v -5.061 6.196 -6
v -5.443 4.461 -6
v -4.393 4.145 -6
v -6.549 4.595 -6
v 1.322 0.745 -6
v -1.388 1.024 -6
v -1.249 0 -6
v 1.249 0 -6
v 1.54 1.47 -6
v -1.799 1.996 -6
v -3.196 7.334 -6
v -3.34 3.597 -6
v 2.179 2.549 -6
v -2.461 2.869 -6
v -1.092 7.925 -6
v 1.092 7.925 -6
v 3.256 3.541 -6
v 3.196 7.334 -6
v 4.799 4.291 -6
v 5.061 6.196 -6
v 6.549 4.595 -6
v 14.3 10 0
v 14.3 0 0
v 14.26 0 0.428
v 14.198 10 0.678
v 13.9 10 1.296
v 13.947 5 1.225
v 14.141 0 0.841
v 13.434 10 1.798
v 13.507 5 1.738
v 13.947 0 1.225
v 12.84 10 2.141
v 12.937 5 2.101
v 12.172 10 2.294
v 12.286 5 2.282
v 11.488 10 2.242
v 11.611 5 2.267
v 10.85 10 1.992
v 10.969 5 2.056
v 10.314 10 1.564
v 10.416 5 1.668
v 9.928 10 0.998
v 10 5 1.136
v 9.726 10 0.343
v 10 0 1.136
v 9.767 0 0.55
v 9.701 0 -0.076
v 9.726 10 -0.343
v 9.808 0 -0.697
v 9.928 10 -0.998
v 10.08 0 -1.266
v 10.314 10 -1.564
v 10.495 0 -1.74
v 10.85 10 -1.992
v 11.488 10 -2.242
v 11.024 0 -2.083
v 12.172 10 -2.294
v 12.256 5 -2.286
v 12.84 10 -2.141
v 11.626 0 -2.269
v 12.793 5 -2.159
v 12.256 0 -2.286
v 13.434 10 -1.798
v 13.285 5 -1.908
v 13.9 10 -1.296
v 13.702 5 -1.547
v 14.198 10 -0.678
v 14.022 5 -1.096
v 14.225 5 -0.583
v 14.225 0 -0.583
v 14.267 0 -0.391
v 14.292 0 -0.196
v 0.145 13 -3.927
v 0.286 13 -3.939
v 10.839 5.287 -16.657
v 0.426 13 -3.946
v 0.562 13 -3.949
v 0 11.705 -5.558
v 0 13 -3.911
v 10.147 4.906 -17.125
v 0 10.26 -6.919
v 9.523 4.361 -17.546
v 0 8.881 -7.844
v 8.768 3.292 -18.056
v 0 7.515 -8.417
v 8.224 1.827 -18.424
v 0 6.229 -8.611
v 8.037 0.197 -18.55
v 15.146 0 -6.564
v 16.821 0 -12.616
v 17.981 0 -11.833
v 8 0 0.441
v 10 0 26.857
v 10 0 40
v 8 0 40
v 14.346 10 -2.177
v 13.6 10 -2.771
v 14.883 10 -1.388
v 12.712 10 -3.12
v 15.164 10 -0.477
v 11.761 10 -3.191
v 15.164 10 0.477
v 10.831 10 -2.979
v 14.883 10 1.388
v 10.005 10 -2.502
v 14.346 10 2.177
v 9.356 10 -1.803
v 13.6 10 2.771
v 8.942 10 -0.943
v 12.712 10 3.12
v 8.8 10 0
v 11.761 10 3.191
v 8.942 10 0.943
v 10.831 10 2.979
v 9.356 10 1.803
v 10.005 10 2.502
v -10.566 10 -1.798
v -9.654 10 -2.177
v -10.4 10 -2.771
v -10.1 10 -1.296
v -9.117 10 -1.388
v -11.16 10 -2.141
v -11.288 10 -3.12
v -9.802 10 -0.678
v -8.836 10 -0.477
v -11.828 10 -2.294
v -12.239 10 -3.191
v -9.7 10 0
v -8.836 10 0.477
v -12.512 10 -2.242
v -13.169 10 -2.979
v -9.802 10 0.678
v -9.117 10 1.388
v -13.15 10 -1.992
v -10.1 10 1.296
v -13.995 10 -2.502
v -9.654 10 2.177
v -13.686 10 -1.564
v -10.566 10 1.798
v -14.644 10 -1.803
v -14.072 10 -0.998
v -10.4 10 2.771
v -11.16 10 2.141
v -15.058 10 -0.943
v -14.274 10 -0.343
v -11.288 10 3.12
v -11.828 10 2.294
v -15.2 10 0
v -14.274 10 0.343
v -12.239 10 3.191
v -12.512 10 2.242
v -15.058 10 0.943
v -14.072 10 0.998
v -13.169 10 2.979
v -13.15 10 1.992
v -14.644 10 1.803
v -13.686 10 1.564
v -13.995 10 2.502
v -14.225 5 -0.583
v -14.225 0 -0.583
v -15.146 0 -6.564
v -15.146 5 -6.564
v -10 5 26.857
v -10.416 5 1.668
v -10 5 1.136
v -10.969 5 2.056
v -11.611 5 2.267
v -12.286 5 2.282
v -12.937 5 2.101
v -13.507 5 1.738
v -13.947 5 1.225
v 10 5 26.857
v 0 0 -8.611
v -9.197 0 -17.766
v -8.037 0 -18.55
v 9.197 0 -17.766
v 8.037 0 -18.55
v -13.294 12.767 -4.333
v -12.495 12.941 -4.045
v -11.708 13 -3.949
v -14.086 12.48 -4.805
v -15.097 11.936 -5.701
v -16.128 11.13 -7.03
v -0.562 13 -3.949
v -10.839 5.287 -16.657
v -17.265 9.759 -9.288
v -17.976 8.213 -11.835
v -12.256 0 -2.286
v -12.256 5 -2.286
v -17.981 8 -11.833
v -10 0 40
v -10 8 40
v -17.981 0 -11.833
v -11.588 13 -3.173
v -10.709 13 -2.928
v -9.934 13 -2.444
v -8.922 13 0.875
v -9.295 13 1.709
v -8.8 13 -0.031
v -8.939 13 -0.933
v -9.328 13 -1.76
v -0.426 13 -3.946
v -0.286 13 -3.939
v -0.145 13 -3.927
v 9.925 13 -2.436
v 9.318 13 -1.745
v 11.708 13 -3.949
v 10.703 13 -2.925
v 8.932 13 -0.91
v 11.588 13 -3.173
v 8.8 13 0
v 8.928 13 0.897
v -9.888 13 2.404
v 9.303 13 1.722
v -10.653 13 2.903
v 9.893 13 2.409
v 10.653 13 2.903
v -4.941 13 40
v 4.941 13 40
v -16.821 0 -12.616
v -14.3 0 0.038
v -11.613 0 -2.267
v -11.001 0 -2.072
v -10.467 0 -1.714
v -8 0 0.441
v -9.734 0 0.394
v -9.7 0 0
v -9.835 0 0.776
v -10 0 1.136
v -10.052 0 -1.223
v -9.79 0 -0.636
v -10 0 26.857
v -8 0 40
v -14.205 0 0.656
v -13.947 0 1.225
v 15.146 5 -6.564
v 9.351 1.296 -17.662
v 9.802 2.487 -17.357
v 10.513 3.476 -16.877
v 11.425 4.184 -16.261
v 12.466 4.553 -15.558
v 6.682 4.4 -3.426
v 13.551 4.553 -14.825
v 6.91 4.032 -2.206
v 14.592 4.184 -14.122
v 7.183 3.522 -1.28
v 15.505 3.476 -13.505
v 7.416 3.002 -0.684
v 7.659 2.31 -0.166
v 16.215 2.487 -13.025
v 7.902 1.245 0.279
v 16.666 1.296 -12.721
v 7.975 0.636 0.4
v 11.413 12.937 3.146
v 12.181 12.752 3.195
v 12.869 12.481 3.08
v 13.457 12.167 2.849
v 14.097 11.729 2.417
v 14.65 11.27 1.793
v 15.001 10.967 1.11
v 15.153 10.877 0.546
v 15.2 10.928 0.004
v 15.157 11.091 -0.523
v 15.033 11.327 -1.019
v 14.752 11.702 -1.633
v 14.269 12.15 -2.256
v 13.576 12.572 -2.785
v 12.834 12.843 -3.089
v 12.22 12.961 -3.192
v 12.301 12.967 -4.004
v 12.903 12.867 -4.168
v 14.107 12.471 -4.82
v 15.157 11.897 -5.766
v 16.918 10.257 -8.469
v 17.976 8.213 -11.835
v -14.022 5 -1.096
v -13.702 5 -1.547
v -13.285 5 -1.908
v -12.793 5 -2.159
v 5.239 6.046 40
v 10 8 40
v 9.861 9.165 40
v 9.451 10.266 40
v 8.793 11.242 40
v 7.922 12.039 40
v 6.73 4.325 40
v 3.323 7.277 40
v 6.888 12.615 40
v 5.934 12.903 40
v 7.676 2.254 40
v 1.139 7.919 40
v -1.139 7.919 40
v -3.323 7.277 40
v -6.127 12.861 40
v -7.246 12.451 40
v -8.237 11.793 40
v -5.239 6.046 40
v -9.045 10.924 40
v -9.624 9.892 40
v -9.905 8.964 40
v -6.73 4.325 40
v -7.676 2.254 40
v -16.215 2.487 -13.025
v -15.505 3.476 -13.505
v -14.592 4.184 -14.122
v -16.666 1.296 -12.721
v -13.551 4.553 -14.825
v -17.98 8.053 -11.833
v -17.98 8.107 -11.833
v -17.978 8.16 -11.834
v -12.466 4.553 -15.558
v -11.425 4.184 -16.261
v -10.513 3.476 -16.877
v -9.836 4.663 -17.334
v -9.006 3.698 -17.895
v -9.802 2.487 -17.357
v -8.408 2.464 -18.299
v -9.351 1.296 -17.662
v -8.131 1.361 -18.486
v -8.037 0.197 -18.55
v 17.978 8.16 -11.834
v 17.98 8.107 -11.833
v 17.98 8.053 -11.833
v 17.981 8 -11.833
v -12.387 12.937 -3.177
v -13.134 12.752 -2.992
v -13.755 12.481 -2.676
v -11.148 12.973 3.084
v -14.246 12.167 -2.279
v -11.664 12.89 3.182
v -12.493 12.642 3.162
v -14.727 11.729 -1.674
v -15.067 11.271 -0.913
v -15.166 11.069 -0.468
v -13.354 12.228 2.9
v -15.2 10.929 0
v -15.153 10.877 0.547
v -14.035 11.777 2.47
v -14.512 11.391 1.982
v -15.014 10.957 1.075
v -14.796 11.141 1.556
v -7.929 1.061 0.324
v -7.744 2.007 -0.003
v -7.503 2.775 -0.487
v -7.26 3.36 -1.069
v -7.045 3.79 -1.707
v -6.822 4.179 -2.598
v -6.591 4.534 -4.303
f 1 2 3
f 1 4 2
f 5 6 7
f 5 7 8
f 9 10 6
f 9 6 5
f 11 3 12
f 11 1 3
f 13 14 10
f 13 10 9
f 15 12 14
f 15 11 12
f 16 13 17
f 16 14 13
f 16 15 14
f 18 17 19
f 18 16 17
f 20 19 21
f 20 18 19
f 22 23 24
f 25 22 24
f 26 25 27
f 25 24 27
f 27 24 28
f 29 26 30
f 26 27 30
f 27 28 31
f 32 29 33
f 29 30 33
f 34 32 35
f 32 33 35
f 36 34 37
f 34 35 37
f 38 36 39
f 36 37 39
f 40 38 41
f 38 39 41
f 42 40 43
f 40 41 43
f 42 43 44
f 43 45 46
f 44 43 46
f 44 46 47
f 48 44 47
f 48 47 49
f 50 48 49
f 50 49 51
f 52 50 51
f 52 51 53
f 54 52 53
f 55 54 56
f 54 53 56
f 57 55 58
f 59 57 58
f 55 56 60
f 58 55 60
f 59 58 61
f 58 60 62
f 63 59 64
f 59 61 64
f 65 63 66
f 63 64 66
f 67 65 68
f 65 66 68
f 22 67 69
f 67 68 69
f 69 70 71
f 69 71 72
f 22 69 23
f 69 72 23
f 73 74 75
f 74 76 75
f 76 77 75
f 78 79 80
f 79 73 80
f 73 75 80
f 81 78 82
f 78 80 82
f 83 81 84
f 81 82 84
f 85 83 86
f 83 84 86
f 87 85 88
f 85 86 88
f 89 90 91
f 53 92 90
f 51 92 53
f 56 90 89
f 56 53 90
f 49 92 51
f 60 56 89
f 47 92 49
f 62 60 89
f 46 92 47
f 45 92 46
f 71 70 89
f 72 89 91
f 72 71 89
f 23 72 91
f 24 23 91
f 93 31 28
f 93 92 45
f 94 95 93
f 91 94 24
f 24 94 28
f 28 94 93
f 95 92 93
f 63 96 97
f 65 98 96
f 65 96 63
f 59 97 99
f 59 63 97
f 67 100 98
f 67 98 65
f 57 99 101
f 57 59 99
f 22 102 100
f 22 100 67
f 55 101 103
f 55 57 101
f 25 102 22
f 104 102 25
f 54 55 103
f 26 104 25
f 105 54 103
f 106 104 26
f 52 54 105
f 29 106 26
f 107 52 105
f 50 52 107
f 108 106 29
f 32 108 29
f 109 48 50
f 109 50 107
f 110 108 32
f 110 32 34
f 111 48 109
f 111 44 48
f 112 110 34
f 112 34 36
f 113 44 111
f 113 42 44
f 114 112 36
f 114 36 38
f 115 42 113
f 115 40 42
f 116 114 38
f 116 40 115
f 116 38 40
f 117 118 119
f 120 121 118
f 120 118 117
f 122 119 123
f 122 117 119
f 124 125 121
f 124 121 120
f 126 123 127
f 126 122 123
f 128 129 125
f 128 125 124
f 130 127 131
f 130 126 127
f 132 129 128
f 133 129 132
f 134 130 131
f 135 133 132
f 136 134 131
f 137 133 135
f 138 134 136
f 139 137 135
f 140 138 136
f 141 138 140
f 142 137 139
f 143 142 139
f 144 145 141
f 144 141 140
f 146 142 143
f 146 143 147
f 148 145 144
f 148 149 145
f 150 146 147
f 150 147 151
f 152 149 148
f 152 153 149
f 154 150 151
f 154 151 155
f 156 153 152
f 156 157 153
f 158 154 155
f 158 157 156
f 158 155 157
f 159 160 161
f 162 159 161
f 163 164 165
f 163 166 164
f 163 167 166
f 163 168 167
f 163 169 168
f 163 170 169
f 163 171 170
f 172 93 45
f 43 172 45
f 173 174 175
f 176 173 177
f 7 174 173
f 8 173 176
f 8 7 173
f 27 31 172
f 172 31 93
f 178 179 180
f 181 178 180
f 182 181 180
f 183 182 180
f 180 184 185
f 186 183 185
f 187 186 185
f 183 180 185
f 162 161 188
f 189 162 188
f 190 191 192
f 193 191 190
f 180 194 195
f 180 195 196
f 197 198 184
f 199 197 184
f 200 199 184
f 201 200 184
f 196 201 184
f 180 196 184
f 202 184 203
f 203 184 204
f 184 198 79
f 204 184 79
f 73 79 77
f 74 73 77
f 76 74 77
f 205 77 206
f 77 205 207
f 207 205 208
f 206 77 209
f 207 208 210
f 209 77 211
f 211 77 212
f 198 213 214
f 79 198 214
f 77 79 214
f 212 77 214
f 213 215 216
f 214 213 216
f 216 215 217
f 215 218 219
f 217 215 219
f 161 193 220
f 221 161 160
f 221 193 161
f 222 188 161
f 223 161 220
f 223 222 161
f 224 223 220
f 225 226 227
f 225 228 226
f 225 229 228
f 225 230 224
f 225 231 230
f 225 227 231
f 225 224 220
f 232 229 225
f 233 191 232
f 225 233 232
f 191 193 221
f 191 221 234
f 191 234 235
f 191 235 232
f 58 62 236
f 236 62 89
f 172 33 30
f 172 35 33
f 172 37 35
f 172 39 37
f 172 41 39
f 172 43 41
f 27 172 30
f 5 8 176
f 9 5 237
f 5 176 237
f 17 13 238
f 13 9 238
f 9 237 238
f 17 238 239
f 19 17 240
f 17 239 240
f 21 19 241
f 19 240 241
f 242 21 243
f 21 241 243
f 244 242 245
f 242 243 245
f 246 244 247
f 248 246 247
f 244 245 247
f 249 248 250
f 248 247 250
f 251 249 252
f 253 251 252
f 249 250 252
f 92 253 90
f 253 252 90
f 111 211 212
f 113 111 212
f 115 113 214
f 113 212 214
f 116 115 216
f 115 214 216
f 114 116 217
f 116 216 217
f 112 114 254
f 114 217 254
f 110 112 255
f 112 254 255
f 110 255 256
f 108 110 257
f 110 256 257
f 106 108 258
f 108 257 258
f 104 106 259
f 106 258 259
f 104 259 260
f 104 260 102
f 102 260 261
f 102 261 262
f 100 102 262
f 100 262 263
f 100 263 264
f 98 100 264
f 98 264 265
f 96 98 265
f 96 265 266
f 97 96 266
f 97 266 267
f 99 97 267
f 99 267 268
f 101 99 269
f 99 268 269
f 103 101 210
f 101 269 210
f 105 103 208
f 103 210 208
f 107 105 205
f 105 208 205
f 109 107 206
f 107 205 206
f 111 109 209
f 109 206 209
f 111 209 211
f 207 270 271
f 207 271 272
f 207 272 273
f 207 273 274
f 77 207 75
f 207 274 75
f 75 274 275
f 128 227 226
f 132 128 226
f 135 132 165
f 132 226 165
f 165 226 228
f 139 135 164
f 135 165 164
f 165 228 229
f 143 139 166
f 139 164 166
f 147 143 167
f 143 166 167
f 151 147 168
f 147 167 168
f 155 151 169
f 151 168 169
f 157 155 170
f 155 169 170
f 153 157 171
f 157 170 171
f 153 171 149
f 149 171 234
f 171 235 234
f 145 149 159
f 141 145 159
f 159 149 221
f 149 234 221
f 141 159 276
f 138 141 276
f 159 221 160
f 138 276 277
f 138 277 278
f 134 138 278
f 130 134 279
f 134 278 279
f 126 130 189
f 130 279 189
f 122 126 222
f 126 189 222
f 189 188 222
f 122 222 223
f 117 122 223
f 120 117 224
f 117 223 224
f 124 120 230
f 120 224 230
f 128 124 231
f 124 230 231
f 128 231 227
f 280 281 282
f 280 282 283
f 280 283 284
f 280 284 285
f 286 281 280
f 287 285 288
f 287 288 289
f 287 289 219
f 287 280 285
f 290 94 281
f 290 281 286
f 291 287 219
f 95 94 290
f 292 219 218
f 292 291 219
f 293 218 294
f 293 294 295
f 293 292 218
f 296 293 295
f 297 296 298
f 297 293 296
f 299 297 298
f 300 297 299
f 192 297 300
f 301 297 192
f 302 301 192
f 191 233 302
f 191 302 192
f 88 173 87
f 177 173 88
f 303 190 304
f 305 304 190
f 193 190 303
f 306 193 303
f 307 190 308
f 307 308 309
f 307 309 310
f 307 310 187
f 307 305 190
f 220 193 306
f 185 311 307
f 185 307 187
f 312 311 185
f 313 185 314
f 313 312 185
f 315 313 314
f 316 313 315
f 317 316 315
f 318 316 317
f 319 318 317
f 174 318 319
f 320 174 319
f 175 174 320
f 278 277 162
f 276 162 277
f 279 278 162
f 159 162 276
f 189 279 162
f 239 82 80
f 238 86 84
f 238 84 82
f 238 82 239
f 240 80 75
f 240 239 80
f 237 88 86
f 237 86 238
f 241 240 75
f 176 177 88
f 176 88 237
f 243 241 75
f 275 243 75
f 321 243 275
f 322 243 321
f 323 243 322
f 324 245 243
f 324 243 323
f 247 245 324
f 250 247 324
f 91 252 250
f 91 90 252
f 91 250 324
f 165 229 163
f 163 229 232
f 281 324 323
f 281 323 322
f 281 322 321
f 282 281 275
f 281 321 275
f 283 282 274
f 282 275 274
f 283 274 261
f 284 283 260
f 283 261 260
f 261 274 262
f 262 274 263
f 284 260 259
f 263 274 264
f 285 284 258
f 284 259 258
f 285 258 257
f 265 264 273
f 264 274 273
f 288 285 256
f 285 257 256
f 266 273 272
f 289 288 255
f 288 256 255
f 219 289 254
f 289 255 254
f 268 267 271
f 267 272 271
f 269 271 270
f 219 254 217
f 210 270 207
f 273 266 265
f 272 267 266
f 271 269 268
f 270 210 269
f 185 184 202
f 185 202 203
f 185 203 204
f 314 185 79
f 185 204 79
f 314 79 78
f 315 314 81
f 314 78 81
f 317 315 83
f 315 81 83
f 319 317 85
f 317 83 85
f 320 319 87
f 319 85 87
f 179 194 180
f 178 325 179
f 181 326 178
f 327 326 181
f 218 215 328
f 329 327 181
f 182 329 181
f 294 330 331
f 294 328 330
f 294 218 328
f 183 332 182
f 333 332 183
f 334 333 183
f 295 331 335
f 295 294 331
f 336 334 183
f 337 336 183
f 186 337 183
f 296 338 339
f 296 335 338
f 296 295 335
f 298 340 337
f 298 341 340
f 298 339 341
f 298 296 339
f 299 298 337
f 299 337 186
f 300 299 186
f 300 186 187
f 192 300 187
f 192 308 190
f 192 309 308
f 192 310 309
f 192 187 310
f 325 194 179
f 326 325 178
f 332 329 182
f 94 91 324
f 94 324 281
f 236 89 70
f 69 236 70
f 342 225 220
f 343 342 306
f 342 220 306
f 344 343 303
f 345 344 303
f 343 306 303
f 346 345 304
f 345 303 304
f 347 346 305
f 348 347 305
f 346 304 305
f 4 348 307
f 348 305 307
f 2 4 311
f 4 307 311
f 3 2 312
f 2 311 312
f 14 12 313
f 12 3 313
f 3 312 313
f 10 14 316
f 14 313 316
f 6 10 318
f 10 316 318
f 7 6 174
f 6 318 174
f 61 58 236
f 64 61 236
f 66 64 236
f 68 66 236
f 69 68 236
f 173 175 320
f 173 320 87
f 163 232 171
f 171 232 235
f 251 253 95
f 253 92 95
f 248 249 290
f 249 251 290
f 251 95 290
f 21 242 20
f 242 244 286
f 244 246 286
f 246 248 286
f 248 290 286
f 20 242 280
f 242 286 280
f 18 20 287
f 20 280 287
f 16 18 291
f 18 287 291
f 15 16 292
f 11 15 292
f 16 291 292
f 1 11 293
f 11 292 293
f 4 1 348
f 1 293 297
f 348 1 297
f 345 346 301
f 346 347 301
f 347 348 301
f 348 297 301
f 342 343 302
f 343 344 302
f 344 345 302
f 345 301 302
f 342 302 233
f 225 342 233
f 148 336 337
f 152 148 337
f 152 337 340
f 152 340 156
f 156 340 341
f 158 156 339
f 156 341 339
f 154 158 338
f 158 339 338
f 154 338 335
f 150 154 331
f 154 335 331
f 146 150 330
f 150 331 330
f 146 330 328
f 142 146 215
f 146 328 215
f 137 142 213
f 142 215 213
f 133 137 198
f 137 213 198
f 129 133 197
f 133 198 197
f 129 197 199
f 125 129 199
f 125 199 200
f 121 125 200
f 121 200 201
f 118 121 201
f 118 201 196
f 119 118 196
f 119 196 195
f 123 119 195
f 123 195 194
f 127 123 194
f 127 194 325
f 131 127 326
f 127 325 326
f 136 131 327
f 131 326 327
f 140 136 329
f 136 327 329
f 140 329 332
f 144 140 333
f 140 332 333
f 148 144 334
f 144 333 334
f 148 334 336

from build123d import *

# Parameters (mm, degrees)
F0_R          = 2.3
F1_DEPTH      = 13
F3_DEPTH      = 46
F6_DEPTH      = 52.2
F8_DEPTH      = 25
F10_DEPTH     = 25
F11_T1_DEPTH  = 69.4664340584
F11_T3_DEPTH  = 69.4664340584
F11_T8_DEPTH  = 31.9524083705
F11_T13_DEPTH = 31.9524083705
F11_T19_DEPTH = 31.9524083705
F11_T23_DEPTH = 31.9524083705
F15_DEPTH     = 5
F16_DEPTH     = 5
F18_R         = 3.2
F19_DEPTH     = 28


# Not quite as in the source:
# - a fillet or chamfer that OpenCascade refuses, or shapes differently, is made with other operations: its cross-section is extruded or revolved along the edge and cut away or added
# - a feature names something its author has since deleted; it is built from what else it names


with BuildPart() as f1:
    # F0 (on Front) → F1 (new body)
    with BuildSketch(Plane.XZ):
        Polygon((10, 40), (-10, 40), (-17.9806351662, -11.8325809017), (-8.0368565166, -18.5498173996), (0, -8.6111112242), (8.0368565166, -18.5498173996), (17.9806351662, -11.8325809017), align=None)
        with Locations((-12, 0)):
            Circle(F0_R, mode=Mode.SUBTRACT)
        with Locations((12, 0)):
            Circle(F0_R, mode=Mode.SUBTRACT)
    extrude(amount=-F1_DEPTH)

    # F2 (on face) → F3 (cut)
    with BuildSketch(Plane.XY.offset(40)):
        with BuildLine():
            Line((-8, 0), (8, 0))
            ThreePointArc((8, 0), (0, 8), (-8, 0))
        make_face()
    extrude(amount=-F3_DEPTH, mode=Mode.SUBTRACT)

    # F5 (on offset) → F6 (cut)
    with BuildSketch(Plane.YZ.offset(25)):
        Polygon((13, -3.9485500787), (4.1381944902, -18.5498173996), (13, -18.5498173996), align=None)
    extrude(amount=-F6_DEPTH, mode=Mode.SUBTRACT)

    # F7 (on face) → F8 (cut)
    with BuildSketch(Plane(origin=(-11.122658813, 0, -16.4652915326), x_dir=(0.8286482208, 0, -0.5597697082), z_dir=(-0.5597697082, 0, -0.8286482208))):
        with BuildLine():
            ThreePointArc((-6.8761009811, 0), (-2.2761009811, -4.6), (2.3238990189, 0))
            Line((2.3238990189, 0), (-6.8761009811, 0))
        make_face()
    extrude(amount=-F8_DEPTH, mode=Mode.SUBTRACT)

    # F9 (on face) → F10 (cut)
    with BuildSketch(Plane(origin=(11.122658813, 0, -16.4652915326), x_dir=(0.8286482208, 0, 0.5597697082), z_dir=(0.5597697082, 0, -0.8286482208))):
        with BuildLine():
            ThreePointArc((-2.3238990189, 0), (2.2761009811, -4.6), (6.8761009811, 0))
            Line((6.8761009811, 0), (-2.3238990189, 0))
        make_face()
    extrude(amount=-F10_DEPTH, mode=Mode.SUBTRACT)

    # F11: fillet of radius 5 on 4 edges, made by hand

    # F11_s2 → F11_t1 (cut)
    with BuildSketch(Plane(origin=(7.6867833124, 0, 49.9240736631), x_dir=(0, 1, 0), z_dir=(-0.152176248, 0, -0.9883533728))):
        with BuildLine():
            ThreePointArc((13, -10.9705836466), (11.5355339059, -14.5061175525), (8, -15.9705836466))
            Line((8, -15.9705836466), (13, -15.9705836466))
            Line((13, -15.9705836466), (13, -10.9705836466))
        make_face()
    extrude(amount=F11_T1_DEPTH, mode=Mode.SUBTRACT)

    # F11_s4 → F11_t3 (cut)
    with BuildSketch(Plane(origin=(2.8843579817, 0, -18.733310736), x_dir=(0, 1, 0), z_dir=(-0.152176248, 0, 0.9883533728))):
        with BuildLine():
            ThreePointArc((8, -15.9705836466), (11.5355339059, -14.5061175525), (13, -10.9705836466))
            Line((13, -10.9705836466), (13, -15.9705836466))
            Line((13, -15.9705836466), (8, -15.9705836466))
        make_face()
    extrude(amount=F11_T3_DEPTH, mode=Mode.SUBTRACT)


with BuildPart() as f11_tool6:
    # F11_s7 → F11_t8 (new body)
    with BuildSketch(Plane(origin=(4.0911710208, 3.0705977915, 5.0593097692), x_dir=(0.6002776597, -0.7997916799, 0), z_dir=(-0.5686414, -0.4267895471, -0.7032052622))):
        with BuildLine():
            ThreePointArc((-10.7347001393, -7.9787789452), (-7.9821654916, -9.2854915519), (-4.9822833283, -8.7519638303))
            Line((-4.9822833283, -8.7519638303), (-8.1340389445, -10.4154145762))
            Line((-8.1340389445, -10.4154145762), (-10.7347001393, -7.9787789452))
        make_face()
    extrude(amount=F11_T8_DEPTH)

    split(bisect_by=Plane(origin=(-4.2102294585, 0, -3.404568911), x_dir=(0, 1, 0), z_dir=(-0.7775800359, 0, -0.6287839754)), keep=Keep.TOP)


with BuildPart() as f1_1:
    add(f1.part)

    # F11_t5: cut F11_tool6
    add(f11_tool6.part, mode=Mode.SUBTRACT)


with BuildPart() as f11_tool11:
    # F11_s12 → F11_t13 (new body)
    with BuildSketch(Plane(origin=(14.0782912081, -10.566356105, -17.4097919354), x_dir=(-0.6002776597, -0.7997916799, 0), z_dir=(-0.5686414, 0.4267895471, 0.7032052622))):
        with BuildLine():
            ThreePointArc((-10.7347001393, -7.9787789452), (-7.9821654916, -9.2854915519), (-4.9822833283, -8.7519638303))
            Line((-4.9822833283, -8.7519638303), (-8.1340389445, -10.4154145762))
            Line((-8.1340389445, -10.4154145762), (-10.7347001393, -7.9787789452))
        make_face()
    extrude(amount=F11_T13_DEPTH)

    split(bisect_by=Plane(origin=(4.2102294585, 0, -3.404568911), x_dir=(0, 1, 0), z_dir=(0.7775800359, 0, -0.6287839754)), keep=Keep.TOP)


with BuildPart() as f1_2:
    add(f1_1.part)

    # F11_t10: cut F11_tool11
    add(f11_tool11.part, mode=Mode.SUBTRACT)


with BuildPart() as f11_tool17:
    # F11_s18 → F11_t19 (new body)
    with BuildSketch(Plane(origin=(14.0782912081, -10.566356105, -17.4097919354), x_dir=(-0.6002776597, -0.7997916799, 0), z_dir=(-0.5686414, 0.4267895471, 0.7032052622))):
        with BuildLine():
            ThreePointArc((-10.7347001393, -7.9787789452), (-7.9821654916, -9.2854915519), (-4.9822833283, -8.7519638303))
            Line((-4.9822833283, -8.7519638303), (-8.1340389445, -10.4154145762))
            Line((-8.1340389445, -10.4154145762), (-10.7347001393, -7.9787789452))
        make_face()
    extrude(amount=F11_T19_DEPTH)

    split(bisect_by=Plane(origin=(4.2102294585, 0, -3.404568911), x_dir=(0, 1, 0), z_dir=(-0.7775800359, 0, 0.6287839754)), keep=Keep.TOP)


with BuildPart() as f11_tool21:
    # F11_s22 → F11_t23 (new body)
    with BuildSketch(Plane(origin=(4.0911710208, 3.0705977915, 5.0593097692), x_dir=(0.6002776597, -0.7997916799, 0), z_dir=(-0.5686414, -0.4267895471, -0.7032052622))):
        with BuildLine():
            ThreePointArc((-10.7347001393, -7.9787789452), (-7.9821654916, -9.2854915519), (-4.9822833283, -8.7519638303))
            Line((-4.9822833283, -8.7519638303), (-8.1340389445, -10.4154145762))
            Line((-8.1340389445, -10.4154145762), (-10.7347001393, -7.9787789452))
        make_face()
    extrude(amount=F11_T23_DEPTH)

    split(bisect_by=Plane(origin=(-4.2102294585, 0, -3.404568911), x_dir=(0, 1, 0), z_dir=(0.7775800359, 0, 0.6287839754)), keep=Keep.TOP)


with BuildPart() as f11_tool17_1:
    add(f11_tool17.part)

    # F11_t25: intersect F11_tool21
    add(f11_tool21.part, mode=Mode.INTERSECT)


with BuildPart() as f1_3:
    add(f1_2.part)

    # F11_t15: cut F11_tool17
    add(f11_tool17_1.part, mode=Mode.SUBTRACT)

    # F14 (on face) → F15 (cut)
    with BuildSketch(Plane.XZ):
        Polygon((-15.1459260242, -6.5643846345), (-10, 1.0533238305), (-10, 26.8573445146), align=None)
    extrude(amount=-F15_DEPTH, mode=Mode.SUBTRACT)

    # F12 (on face) → F16 (cut)
    with BuildSketch(Plane.XZ):
        Polygon((15.1459253956, -6.5643830302), (10.0000003771, 26.8573395869), (10.0000003771, 1.0533239459), align=None)
    extrude(amount=-F16_DEPTH, mode=Mode.SUBTRACT)

    # F18 (on offset) → F19 (cut)
    with BuildSketch(Plane(origin=(0, 38, 0), x_dir=(-1, 0, 0), z_dir=(0, 1, 0))):
        with Locations((-12, 0)):
            Circle(F18_R)
        with Locations((12, 0)):
            Circle(F18_R)
    extrude(amount=-F19_DEPTH, mode=Mode.SUBTRACT)


solid = f1_3.part
